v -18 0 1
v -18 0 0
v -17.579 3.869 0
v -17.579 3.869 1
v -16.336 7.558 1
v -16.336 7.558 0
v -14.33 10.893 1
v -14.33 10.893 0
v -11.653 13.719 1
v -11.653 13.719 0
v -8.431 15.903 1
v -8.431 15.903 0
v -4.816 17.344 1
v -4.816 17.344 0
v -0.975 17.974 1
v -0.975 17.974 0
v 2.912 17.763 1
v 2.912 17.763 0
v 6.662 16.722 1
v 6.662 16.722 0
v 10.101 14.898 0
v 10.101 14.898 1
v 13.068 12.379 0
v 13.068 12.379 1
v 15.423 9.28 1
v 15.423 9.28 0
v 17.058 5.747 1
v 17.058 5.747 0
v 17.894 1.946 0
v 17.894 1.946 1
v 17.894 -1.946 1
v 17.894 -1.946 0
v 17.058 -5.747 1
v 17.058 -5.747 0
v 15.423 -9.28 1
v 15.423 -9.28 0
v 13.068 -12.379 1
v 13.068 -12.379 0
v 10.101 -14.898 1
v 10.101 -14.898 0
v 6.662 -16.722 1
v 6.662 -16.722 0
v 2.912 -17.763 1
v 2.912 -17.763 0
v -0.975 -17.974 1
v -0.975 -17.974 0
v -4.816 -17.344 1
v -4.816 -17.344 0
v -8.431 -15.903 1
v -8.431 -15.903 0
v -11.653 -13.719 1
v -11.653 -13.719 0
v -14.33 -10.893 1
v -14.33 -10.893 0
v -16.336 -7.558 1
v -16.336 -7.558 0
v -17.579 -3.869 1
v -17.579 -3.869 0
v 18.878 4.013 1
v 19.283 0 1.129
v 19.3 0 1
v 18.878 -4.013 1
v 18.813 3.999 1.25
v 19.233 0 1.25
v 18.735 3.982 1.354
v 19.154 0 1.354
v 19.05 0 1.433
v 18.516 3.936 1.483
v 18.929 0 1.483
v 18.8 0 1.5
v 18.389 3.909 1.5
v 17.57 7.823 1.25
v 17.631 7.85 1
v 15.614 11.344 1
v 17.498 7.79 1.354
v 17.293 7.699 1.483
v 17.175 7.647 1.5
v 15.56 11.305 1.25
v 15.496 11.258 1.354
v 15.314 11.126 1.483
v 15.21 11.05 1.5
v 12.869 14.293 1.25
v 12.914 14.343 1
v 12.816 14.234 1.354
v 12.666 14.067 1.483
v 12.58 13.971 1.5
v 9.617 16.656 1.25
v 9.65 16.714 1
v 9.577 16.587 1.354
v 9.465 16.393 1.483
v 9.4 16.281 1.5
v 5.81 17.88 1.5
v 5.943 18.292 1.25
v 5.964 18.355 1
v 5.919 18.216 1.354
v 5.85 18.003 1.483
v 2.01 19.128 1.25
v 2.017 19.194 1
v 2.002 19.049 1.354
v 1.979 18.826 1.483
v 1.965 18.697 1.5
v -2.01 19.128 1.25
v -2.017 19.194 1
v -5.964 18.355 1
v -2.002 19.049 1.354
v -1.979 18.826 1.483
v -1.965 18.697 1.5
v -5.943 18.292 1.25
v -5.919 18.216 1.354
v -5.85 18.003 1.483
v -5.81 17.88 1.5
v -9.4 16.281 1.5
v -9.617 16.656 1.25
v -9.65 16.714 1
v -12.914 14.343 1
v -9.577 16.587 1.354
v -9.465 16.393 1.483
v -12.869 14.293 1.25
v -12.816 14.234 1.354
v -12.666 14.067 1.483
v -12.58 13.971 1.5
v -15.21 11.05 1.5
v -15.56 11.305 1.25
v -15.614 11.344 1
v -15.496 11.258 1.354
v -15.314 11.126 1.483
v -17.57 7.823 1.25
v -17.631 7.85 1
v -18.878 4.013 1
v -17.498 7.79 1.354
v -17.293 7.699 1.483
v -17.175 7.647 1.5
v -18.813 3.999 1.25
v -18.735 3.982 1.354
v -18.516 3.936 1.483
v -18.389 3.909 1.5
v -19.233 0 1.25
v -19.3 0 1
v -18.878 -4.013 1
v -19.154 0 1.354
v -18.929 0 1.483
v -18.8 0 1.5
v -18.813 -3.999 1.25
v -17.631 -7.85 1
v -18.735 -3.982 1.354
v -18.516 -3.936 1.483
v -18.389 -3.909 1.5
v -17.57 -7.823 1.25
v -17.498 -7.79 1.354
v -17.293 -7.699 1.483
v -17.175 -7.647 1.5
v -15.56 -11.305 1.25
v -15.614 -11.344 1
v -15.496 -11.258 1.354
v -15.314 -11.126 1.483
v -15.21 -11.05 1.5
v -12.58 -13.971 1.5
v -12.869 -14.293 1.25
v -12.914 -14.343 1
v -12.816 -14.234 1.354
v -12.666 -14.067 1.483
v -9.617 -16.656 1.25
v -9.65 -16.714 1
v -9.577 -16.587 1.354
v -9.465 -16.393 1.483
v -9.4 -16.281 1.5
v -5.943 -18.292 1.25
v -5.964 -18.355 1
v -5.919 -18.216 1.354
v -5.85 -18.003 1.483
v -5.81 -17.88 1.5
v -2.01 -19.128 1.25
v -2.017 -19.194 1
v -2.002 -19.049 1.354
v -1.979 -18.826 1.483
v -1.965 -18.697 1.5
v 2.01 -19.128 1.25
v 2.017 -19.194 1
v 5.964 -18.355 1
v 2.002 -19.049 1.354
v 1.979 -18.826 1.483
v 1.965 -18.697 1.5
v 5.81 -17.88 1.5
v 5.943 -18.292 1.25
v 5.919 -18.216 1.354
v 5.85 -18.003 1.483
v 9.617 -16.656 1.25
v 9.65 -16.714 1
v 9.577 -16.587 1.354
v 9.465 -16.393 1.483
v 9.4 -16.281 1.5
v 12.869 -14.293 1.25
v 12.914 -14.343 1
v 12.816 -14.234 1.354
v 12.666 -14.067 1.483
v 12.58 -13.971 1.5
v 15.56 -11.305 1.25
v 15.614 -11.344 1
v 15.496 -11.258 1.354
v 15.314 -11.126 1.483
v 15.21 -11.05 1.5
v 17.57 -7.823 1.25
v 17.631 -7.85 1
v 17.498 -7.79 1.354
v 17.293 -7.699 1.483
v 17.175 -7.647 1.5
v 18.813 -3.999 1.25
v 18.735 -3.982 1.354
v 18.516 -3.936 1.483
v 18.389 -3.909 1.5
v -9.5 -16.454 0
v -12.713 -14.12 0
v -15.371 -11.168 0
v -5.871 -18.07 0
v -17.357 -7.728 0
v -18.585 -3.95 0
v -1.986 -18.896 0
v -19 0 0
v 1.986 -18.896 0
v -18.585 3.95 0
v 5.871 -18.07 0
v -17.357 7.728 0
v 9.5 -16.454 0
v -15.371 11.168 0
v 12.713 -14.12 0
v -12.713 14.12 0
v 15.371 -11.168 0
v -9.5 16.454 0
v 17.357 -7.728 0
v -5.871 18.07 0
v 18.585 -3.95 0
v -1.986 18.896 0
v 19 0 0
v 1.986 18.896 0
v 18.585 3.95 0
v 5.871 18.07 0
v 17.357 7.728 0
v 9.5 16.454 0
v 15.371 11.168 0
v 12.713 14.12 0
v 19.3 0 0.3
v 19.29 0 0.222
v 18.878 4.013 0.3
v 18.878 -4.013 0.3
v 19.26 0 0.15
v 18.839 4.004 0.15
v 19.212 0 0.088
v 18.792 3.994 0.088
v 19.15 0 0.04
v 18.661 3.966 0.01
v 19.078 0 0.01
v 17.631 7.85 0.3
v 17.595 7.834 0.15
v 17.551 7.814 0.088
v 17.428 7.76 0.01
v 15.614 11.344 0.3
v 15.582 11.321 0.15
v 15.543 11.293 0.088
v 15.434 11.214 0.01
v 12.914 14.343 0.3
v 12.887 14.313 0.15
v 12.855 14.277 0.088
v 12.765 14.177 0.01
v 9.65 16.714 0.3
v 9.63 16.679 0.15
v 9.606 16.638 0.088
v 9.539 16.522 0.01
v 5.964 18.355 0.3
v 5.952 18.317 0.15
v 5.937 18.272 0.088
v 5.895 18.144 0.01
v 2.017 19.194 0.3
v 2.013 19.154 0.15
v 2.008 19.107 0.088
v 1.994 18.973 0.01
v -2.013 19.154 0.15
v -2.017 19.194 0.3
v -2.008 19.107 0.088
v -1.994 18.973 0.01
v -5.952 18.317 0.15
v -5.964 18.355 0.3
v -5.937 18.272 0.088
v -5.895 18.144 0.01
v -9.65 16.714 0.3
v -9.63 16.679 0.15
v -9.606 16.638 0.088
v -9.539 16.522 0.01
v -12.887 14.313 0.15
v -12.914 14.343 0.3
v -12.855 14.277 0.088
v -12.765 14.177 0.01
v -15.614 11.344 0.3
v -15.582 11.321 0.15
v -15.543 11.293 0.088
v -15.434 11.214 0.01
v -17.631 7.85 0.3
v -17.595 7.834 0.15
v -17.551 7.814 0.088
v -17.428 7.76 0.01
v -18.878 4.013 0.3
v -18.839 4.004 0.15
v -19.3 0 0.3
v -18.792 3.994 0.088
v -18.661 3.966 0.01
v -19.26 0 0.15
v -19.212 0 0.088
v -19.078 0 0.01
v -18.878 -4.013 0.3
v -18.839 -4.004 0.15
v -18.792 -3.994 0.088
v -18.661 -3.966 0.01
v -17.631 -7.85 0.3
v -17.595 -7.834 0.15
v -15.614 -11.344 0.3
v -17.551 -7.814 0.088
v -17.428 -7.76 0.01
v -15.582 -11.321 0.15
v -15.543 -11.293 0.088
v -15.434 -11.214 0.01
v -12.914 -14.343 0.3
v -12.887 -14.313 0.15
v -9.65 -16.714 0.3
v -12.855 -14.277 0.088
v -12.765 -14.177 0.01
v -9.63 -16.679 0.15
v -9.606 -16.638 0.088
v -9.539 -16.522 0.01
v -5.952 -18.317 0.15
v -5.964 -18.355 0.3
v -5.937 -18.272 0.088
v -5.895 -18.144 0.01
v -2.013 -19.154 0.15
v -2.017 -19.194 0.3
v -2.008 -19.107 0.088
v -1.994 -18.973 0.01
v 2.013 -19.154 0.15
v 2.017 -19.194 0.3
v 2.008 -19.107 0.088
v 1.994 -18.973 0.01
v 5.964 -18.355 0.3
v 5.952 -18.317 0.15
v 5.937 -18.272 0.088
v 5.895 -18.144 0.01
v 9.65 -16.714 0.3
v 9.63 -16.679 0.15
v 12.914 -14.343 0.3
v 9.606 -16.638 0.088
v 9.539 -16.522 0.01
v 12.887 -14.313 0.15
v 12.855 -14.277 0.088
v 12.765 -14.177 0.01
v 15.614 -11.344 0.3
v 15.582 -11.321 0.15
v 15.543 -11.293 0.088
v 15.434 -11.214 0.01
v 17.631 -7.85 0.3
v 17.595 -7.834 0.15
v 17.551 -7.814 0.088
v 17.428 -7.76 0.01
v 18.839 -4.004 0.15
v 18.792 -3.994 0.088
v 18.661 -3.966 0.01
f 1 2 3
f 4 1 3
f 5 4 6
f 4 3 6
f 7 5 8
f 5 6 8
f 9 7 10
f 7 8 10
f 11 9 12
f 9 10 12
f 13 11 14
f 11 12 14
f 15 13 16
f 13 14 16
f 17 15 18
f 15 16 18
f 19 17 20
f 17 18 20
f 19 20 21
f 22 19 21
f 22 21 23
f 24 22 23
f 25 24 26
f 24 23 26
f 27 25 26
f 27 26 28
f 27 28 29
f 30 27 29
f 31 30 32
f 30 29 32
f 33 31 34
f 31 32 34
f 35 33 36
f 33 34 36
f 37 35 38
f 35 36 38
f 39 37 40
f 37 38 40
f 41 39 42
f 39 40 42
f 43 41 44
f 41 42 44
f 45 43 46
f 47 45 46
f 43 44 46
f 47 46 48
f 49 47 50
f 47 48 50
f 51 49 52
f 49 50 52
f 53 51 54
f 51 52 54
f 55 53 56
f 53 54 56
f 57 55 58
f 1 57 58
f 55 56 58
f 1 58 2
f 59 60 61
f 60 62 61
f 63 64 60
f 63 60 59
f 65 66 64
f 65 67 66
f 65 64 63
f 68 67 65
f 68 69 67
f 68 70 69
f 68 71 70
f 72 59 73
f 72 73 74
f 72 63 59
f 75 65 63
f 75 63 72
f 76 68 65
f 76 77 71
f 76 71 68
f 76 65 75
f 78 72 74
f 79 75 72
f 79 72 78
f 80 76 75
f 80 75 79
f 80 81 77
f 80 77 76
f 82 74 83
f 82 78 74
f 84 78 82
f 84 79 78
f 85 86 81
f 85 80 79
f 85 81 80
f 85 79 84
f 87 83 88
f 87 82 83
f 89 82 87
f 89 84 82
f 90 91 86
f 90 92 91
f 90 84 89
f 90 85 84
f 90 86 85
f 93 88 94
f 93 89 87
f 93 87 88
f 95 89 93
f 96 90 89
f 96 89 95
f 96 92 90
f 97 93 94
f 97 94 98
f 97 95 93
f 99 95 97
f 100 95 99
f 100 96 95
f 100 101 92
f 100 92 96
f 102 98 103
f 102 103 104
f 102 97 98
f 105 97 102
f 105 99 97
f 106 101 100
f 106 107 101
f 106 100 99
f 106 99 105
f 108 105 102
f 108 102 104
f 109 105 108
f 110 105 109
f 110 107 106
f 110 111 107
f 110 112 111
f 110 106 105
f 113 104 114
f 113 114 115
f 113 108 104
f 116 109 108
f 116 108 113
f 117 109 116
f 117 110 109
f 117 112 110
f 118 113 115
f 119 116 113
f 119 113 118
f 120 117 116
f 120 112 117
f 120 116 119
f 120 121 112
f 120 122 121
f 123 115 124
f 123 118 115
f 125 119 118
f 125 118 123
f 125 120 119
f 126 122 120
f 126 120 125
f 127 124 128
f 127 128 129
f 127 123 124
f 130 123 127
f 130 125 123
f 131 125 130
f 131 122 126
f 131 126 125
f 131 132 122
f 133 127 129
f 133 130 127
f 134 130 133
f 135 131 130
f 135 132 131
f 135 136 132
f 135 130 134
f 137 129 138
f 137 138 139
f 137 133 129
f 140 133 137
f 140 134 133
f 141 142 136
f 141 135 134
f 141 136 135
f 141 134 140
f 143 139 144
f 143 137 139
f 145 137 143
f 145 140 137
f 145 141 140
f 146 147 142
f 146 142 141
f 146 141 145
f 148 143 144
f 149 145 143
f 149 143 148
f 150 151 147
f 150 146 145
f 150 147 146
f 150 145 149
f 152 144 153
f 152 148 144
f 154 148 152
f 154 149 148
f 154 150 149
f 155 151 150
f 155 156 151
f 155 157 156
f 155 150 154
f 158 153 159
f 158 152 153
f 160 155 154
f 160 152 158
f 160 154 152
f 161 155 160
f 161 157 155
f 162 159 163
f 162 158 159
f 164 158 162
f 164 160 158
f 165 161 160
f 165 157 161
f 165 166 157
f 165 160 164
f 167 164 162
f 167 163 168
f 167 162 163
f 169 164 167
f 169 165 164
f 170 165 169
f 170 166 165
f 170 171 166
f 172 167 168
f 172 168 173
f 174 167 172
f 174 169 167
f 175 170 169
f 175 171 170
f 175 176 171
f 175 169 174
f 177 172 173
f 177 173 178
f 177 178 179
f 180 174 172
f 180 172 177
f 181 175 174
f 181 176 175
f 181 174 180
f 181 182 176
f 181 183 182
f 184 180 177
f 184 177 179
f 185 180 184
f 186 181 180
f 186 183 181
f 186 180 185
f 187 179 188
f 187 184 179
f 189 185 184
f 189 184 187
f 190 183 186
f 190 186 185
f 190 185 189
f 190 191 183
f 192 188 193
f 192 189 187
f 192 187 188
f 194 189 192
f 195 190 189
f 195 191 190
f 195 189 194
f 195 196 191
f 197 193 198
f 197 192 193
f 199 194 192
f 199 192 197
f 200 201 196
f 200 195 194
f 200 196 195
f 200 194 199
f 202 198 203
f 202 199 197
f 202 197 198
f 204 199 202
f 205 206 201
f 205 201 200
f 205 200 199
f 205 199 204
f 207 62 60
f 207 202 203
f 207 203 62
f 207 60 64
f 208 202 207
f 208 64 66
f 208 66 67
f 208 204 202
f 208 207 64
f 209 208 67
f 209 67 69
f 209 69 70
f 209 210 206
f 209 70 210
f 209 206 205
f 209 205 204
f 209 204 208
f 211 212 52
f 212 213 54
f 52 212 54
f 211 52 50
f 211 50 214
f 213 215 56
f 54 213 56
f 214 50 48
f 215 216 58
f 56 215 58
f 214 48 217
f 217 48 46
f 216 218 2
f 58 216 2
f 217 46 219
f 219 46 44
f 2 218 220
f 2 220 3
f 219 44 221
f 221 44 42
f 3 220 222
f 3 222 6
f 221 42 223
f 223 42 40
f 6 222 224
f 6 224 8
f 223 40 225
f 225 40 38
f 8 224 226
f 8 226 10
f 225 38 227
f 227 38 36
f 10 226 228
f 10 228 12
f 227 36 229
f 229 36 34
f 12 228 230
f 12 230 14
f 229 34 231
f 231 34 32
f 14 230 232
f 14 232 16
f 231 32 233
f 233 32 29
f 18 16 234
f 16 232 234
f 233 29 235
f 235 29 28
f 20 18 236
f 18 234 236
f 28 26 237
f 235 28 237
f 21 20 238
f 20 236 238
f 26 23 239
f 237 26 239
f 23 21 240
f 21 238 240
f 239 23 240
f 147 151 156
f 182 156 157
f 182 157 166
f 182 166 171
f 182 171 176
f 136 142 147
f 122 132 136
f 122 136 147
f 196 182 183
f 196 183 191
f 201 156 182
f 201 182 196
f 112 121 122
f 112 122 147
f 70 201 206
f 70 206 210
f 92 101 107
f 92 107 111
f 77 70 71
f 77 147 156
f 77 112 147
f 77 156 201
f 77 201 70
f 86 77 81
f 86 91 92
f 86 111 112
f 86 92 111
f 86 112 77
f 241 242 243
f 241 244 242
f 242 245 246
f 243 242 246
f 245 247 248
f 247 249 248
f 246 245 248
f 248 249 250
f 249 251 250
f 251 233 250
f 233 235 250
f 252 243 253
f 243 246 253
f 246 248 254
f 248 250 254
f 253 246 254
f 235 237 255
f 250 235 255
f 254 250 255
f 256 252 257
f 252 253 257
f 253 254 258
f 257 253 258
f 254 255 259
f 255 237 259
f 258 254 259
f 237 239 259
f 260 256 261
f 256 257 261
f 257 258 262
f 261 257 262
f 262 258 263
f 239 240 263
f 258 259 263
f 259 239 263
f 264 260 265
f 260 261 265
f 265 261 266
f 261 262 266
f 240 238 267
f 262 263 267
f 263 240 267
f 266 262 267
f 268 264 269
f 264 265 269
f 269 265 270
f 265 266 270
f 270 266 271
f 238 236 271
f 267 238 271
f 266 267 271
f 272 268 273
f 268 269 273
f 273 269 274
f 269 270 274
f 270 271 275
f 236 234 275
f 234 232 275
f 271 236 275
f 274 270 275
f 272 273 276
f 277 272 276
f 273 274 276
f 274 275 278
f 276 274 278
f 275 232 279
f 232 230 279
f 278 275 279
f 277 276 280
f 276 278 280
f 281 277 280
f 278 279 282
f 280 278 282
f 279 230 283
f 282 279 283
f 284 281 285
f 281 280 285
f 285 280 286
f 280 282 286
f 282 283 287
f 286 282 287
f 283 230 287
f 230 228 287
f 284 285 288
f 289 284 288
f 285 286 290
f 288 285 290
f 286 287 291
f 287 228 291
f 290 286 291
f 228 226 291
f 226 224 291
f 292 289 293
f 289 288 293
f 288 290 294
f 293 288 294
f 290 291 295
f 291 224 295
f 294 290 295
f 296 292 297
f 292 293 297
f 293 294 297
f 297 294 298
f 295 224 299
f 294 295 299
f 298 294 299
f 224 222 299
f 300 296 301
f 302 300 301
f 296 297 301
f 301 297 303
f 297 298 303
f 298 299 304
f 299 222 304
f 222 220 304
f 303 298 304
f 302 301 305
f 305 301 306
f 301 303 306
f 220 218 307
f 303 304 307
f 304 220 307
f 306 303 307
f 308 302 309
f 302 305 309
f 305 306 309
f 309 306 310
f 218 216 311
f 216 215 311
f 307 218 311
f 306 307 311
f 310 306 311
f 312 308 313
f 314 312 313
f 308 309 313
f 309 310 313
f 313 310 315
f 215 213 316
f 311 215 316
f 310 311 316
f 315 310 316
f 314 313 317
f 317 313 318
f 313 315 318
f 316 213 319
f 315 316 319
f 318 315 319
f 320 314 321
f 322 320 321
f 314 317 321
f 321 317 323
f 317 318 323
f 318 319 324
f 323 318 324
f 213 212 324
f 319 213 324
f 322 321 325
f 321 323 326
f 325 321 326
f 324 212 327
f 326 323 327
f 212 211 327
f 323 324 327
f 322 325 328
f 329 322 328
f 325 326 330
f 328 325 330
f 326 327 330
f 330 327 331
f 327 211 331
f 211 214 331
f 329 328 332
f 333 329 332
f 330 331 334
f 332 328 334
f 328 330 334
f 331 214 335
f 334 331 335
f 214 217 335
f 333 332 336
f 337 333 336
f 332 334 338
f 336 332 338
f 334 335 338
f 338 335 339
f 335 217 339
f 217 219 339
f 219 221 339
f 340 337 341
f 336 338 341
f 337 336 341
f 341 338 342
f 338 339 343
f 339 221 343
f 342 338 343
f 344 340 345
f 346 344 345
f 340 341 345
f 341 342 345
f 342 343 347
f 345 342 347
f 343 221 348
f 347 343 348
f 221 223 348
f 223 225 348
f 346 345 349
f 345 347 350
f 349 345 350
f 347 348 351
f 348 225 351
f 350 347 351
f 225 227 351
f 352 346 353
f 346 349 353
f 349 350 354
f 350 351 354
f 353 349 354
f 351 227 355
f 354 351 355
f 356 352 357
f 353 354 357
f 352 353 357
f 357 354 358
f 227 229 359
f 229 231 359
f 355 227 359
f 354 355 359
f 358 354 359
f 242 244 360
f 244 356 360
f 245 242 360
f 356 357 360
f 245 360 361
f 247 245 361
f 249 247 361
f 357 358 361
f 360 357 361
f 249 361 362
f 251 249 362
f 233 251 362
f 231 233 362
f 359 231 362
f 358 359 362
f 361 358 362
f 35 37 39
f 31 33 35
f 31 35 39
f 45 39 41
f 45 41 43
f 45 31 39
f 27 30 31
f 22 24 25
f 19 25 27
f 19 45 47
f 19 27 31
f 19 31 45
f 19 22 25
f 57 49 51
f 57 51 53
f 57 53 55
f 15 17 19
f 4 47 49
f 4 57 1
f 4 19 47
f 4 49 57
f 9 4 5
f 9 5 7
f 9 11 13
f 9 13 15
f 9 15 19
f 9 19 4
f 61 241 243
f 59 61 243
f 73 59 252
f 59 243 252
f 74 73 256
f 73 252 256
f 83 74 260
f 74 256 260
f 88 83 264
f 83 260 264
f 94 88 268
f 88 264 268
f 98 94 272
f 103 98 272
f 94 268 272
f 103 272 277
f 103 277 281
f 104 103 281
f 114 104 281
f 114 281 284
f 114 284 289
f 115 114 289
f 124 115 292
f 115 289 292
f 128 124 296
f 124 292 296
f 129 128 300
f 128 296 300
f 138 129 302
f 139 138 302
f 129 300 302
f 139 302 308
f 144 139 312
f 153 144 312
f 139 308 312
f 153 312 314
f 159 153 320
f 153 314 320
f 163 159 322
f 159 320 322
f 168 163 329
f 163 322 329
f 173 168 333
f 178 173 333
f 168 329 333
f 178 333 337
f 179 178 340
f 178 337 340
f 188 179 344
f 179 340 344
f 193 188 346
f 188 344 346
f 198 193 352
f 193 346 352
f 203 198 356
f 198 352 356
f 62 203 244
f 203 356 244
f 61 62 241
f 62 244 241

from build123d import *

# Parameters (mm, degrees)
ESQUISSE1_R             = 19.3
BOSS_EXTRU_1_DEPTH      = 1.5
ESQUISSE3_R             = 18
ENL_V_MAT_EXTRU_2_DEPTH = 1
CONG_1_R                = 0.5
CONG_2_R                = 0.3


with BuildPart() as part:
    # Esquisse1 → Boss.-Extru.1 (new body)
    with BuildSketch(Plane.XY):
        Circle(ESQUISSE1_R)
    extrude(amount=BOSS_EXTRU_1_DEPTH)

    # Esquisse3 → Enlèv. mat.-Extru.2 (cut)
    with BuildSketch(Plane(origin=(0, 0, 0), x_dir=(-1, 0, 0), z_dir=(0, 0, -1))):
        Circle(ESQUISSE3_R)
    extrude(amount=-ENL_V_MAT_EXTRU_2_DEPTH, mode=Mode.SUBTRACT)

    # Congé1
    cong_1_edges = [part.edges().sort_by_distance(p)[0] for p in [
        (-19.3, 0, 1.5),
    ]]
    fillet(cong_1_edges, radius=CONG_1_R)

    # Congé2
    cong_2_edges = [part.edges().sort_by_distance(p)[0] for p in [
        (-19.3, 0, 0),
    ]]
    fillet(cong_2_edges, radius=CONG_2_R)


solid = part.part
